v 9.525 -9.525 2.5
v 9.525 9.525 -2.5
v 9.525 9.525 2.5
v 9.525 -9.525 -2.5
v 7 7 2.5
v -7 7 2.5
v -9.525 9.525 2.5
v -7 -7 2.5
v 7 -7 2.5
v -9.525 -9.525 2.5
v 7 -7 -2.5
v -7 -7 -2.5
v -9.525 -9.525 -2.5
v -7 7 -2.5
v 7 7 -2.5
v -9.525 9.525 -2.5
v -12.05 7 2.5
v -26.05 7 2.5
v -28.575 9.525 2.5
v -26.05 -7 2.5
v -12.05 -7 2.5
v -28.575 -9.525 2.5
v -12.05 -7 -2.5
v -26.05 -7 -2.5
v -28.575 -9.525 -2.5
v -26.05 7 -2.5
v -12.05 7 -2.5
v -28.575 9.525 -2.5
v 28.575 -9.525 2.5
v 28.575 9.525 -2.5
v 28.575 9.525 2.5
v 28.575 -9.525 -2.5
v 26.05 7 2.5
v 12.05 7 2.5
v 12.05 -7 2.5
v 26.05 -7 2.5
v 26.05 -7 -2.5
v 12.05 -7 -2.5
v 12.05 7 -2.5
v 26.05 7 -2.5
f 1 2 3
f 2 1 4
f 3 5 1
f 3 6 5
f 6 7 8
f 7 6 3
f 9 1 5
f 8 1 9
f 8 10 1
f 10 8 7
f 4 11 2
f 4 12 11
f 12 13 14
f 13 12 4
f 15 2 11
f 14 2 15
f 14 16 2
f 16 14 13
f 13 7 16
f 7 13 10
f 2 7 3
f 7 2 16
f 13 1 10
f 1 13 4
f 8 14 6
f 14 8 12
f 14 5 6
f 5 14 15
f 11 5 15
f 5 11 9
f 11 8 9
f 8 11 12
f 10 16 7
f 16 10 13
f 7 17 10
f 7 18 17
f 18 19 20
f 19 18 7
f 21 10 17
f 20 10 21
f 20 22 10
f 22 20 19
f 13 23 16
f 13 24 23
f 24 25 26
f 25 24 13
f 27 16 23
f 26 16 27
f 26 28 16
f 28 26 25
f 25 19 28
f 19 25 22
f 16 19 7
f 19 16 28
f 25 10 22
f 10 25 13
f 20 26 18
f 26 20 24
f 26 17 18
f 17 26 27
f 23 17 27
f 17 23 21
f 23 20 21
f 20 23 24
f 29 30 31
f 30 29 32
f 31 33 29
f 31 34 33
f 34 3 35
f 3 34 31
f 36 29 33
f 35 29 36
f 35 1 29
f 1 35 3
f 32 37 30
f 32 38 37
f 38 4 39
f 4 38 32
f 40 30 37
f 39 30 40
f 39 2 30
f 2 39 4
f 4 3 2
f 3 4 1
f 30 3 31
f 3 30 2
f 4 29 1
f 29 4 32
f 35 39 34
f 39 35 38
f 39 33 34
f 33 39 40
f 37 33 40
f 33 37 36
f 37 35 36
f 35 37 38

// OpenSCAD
// file: cherry_mx_switch_cutouts.scad
// https://cdn.sparkfun.com/datasheets/Components/Switches/MX%20Series.pdf

$cherry_mx_switch_width=19.05;

// The pcb cutouts are defined on a grid with 0.05 inch spacing,
// which in metric is 1.27mm. The holes are described by diameter
// on the datasheet.
module cherry_mx_pcb_cutout(pins=true, led=true, diode=true) {
    module gridpos(x, y) {
        translate([1.27*x, 1.27*y, 0])
        children();
    }

    module hole(d) {
        circle(d/2, $fn=100);
    }

    gridpos( 0, 0) hole(4);
    gridpos(-3, 2) hole(1.5);
    gridpos( 2, 4) hole(1.5);

    if (pins) {
        gridpos(-4, 0) hole(1.7);
        gridpos( 4, 0) hole(1.7);
    }

    if (led) {
        gridpos(-1, -4) hole(1);
        gridpos( 1, -4) hole(1);
    }

    if (led) {
        gridpos(-3, -4) hole(1);
        gridpos( 3, -4) hole(1);
    }
}

module cherry_mx_plate_cutout() {
    square([14, 14], center=true);
}

module cherry_mx_switch_cutout(u, height) {
    difference() {
        cube([u*$cherry_mx_switch_width, $cherry_mx_switch_width, height], center=true);

        linear_extrude(height*2, center=true)
        children();
    }
}

module cherry_switch_pcb(u, height) {
    cherry_mx_switch_cutout(u, height)
    cherry_mx_pcb_cutout();
}

module cherry_switch_plate(u, height) {
    difference() {
        cube([u*$cherry_mx_switch_width, $cherry_mx_switch_width, height], center=true);
        
        linear_extrude(height*2, center=true)
        cherry_mx_plate_cutout();
    }
}
// main file
include <cherry_mx_switch_cutouts.scad>

module demo_pcb() {
    pcb_height=1.5;
    union() {
        translate([-$cherry_mx_switch_width, 0, 0])
        cherry_switch_pcb(1, pcb_height);

        cherry_switch_pcb(1, pcb_height);

        translate([$cherry_mx_switch_width, 0, 0])
        cherry_switch_pcb(1, pcb_height);
    }
}

module demo_plate() {
    plate_height=5;
    union() {
        translate([-$cherry_mx_switch_width, 0, 0])
        cherry_switch_plate(1, plate_height);

        cherry_switch_plate(1, plate_height);

        translate([$cherry_mx_switch_width, 0, 0])
        cherry_switch_plate(1, plate_height);
    }
}

//pcb_zpos=-1.5/2;
//translate([0, 0, pcb_zpos])
//demo_pcb();

//plate_zpos=5-4/2;
//translate([0, 0, plate_zpos])
demo_plate();
